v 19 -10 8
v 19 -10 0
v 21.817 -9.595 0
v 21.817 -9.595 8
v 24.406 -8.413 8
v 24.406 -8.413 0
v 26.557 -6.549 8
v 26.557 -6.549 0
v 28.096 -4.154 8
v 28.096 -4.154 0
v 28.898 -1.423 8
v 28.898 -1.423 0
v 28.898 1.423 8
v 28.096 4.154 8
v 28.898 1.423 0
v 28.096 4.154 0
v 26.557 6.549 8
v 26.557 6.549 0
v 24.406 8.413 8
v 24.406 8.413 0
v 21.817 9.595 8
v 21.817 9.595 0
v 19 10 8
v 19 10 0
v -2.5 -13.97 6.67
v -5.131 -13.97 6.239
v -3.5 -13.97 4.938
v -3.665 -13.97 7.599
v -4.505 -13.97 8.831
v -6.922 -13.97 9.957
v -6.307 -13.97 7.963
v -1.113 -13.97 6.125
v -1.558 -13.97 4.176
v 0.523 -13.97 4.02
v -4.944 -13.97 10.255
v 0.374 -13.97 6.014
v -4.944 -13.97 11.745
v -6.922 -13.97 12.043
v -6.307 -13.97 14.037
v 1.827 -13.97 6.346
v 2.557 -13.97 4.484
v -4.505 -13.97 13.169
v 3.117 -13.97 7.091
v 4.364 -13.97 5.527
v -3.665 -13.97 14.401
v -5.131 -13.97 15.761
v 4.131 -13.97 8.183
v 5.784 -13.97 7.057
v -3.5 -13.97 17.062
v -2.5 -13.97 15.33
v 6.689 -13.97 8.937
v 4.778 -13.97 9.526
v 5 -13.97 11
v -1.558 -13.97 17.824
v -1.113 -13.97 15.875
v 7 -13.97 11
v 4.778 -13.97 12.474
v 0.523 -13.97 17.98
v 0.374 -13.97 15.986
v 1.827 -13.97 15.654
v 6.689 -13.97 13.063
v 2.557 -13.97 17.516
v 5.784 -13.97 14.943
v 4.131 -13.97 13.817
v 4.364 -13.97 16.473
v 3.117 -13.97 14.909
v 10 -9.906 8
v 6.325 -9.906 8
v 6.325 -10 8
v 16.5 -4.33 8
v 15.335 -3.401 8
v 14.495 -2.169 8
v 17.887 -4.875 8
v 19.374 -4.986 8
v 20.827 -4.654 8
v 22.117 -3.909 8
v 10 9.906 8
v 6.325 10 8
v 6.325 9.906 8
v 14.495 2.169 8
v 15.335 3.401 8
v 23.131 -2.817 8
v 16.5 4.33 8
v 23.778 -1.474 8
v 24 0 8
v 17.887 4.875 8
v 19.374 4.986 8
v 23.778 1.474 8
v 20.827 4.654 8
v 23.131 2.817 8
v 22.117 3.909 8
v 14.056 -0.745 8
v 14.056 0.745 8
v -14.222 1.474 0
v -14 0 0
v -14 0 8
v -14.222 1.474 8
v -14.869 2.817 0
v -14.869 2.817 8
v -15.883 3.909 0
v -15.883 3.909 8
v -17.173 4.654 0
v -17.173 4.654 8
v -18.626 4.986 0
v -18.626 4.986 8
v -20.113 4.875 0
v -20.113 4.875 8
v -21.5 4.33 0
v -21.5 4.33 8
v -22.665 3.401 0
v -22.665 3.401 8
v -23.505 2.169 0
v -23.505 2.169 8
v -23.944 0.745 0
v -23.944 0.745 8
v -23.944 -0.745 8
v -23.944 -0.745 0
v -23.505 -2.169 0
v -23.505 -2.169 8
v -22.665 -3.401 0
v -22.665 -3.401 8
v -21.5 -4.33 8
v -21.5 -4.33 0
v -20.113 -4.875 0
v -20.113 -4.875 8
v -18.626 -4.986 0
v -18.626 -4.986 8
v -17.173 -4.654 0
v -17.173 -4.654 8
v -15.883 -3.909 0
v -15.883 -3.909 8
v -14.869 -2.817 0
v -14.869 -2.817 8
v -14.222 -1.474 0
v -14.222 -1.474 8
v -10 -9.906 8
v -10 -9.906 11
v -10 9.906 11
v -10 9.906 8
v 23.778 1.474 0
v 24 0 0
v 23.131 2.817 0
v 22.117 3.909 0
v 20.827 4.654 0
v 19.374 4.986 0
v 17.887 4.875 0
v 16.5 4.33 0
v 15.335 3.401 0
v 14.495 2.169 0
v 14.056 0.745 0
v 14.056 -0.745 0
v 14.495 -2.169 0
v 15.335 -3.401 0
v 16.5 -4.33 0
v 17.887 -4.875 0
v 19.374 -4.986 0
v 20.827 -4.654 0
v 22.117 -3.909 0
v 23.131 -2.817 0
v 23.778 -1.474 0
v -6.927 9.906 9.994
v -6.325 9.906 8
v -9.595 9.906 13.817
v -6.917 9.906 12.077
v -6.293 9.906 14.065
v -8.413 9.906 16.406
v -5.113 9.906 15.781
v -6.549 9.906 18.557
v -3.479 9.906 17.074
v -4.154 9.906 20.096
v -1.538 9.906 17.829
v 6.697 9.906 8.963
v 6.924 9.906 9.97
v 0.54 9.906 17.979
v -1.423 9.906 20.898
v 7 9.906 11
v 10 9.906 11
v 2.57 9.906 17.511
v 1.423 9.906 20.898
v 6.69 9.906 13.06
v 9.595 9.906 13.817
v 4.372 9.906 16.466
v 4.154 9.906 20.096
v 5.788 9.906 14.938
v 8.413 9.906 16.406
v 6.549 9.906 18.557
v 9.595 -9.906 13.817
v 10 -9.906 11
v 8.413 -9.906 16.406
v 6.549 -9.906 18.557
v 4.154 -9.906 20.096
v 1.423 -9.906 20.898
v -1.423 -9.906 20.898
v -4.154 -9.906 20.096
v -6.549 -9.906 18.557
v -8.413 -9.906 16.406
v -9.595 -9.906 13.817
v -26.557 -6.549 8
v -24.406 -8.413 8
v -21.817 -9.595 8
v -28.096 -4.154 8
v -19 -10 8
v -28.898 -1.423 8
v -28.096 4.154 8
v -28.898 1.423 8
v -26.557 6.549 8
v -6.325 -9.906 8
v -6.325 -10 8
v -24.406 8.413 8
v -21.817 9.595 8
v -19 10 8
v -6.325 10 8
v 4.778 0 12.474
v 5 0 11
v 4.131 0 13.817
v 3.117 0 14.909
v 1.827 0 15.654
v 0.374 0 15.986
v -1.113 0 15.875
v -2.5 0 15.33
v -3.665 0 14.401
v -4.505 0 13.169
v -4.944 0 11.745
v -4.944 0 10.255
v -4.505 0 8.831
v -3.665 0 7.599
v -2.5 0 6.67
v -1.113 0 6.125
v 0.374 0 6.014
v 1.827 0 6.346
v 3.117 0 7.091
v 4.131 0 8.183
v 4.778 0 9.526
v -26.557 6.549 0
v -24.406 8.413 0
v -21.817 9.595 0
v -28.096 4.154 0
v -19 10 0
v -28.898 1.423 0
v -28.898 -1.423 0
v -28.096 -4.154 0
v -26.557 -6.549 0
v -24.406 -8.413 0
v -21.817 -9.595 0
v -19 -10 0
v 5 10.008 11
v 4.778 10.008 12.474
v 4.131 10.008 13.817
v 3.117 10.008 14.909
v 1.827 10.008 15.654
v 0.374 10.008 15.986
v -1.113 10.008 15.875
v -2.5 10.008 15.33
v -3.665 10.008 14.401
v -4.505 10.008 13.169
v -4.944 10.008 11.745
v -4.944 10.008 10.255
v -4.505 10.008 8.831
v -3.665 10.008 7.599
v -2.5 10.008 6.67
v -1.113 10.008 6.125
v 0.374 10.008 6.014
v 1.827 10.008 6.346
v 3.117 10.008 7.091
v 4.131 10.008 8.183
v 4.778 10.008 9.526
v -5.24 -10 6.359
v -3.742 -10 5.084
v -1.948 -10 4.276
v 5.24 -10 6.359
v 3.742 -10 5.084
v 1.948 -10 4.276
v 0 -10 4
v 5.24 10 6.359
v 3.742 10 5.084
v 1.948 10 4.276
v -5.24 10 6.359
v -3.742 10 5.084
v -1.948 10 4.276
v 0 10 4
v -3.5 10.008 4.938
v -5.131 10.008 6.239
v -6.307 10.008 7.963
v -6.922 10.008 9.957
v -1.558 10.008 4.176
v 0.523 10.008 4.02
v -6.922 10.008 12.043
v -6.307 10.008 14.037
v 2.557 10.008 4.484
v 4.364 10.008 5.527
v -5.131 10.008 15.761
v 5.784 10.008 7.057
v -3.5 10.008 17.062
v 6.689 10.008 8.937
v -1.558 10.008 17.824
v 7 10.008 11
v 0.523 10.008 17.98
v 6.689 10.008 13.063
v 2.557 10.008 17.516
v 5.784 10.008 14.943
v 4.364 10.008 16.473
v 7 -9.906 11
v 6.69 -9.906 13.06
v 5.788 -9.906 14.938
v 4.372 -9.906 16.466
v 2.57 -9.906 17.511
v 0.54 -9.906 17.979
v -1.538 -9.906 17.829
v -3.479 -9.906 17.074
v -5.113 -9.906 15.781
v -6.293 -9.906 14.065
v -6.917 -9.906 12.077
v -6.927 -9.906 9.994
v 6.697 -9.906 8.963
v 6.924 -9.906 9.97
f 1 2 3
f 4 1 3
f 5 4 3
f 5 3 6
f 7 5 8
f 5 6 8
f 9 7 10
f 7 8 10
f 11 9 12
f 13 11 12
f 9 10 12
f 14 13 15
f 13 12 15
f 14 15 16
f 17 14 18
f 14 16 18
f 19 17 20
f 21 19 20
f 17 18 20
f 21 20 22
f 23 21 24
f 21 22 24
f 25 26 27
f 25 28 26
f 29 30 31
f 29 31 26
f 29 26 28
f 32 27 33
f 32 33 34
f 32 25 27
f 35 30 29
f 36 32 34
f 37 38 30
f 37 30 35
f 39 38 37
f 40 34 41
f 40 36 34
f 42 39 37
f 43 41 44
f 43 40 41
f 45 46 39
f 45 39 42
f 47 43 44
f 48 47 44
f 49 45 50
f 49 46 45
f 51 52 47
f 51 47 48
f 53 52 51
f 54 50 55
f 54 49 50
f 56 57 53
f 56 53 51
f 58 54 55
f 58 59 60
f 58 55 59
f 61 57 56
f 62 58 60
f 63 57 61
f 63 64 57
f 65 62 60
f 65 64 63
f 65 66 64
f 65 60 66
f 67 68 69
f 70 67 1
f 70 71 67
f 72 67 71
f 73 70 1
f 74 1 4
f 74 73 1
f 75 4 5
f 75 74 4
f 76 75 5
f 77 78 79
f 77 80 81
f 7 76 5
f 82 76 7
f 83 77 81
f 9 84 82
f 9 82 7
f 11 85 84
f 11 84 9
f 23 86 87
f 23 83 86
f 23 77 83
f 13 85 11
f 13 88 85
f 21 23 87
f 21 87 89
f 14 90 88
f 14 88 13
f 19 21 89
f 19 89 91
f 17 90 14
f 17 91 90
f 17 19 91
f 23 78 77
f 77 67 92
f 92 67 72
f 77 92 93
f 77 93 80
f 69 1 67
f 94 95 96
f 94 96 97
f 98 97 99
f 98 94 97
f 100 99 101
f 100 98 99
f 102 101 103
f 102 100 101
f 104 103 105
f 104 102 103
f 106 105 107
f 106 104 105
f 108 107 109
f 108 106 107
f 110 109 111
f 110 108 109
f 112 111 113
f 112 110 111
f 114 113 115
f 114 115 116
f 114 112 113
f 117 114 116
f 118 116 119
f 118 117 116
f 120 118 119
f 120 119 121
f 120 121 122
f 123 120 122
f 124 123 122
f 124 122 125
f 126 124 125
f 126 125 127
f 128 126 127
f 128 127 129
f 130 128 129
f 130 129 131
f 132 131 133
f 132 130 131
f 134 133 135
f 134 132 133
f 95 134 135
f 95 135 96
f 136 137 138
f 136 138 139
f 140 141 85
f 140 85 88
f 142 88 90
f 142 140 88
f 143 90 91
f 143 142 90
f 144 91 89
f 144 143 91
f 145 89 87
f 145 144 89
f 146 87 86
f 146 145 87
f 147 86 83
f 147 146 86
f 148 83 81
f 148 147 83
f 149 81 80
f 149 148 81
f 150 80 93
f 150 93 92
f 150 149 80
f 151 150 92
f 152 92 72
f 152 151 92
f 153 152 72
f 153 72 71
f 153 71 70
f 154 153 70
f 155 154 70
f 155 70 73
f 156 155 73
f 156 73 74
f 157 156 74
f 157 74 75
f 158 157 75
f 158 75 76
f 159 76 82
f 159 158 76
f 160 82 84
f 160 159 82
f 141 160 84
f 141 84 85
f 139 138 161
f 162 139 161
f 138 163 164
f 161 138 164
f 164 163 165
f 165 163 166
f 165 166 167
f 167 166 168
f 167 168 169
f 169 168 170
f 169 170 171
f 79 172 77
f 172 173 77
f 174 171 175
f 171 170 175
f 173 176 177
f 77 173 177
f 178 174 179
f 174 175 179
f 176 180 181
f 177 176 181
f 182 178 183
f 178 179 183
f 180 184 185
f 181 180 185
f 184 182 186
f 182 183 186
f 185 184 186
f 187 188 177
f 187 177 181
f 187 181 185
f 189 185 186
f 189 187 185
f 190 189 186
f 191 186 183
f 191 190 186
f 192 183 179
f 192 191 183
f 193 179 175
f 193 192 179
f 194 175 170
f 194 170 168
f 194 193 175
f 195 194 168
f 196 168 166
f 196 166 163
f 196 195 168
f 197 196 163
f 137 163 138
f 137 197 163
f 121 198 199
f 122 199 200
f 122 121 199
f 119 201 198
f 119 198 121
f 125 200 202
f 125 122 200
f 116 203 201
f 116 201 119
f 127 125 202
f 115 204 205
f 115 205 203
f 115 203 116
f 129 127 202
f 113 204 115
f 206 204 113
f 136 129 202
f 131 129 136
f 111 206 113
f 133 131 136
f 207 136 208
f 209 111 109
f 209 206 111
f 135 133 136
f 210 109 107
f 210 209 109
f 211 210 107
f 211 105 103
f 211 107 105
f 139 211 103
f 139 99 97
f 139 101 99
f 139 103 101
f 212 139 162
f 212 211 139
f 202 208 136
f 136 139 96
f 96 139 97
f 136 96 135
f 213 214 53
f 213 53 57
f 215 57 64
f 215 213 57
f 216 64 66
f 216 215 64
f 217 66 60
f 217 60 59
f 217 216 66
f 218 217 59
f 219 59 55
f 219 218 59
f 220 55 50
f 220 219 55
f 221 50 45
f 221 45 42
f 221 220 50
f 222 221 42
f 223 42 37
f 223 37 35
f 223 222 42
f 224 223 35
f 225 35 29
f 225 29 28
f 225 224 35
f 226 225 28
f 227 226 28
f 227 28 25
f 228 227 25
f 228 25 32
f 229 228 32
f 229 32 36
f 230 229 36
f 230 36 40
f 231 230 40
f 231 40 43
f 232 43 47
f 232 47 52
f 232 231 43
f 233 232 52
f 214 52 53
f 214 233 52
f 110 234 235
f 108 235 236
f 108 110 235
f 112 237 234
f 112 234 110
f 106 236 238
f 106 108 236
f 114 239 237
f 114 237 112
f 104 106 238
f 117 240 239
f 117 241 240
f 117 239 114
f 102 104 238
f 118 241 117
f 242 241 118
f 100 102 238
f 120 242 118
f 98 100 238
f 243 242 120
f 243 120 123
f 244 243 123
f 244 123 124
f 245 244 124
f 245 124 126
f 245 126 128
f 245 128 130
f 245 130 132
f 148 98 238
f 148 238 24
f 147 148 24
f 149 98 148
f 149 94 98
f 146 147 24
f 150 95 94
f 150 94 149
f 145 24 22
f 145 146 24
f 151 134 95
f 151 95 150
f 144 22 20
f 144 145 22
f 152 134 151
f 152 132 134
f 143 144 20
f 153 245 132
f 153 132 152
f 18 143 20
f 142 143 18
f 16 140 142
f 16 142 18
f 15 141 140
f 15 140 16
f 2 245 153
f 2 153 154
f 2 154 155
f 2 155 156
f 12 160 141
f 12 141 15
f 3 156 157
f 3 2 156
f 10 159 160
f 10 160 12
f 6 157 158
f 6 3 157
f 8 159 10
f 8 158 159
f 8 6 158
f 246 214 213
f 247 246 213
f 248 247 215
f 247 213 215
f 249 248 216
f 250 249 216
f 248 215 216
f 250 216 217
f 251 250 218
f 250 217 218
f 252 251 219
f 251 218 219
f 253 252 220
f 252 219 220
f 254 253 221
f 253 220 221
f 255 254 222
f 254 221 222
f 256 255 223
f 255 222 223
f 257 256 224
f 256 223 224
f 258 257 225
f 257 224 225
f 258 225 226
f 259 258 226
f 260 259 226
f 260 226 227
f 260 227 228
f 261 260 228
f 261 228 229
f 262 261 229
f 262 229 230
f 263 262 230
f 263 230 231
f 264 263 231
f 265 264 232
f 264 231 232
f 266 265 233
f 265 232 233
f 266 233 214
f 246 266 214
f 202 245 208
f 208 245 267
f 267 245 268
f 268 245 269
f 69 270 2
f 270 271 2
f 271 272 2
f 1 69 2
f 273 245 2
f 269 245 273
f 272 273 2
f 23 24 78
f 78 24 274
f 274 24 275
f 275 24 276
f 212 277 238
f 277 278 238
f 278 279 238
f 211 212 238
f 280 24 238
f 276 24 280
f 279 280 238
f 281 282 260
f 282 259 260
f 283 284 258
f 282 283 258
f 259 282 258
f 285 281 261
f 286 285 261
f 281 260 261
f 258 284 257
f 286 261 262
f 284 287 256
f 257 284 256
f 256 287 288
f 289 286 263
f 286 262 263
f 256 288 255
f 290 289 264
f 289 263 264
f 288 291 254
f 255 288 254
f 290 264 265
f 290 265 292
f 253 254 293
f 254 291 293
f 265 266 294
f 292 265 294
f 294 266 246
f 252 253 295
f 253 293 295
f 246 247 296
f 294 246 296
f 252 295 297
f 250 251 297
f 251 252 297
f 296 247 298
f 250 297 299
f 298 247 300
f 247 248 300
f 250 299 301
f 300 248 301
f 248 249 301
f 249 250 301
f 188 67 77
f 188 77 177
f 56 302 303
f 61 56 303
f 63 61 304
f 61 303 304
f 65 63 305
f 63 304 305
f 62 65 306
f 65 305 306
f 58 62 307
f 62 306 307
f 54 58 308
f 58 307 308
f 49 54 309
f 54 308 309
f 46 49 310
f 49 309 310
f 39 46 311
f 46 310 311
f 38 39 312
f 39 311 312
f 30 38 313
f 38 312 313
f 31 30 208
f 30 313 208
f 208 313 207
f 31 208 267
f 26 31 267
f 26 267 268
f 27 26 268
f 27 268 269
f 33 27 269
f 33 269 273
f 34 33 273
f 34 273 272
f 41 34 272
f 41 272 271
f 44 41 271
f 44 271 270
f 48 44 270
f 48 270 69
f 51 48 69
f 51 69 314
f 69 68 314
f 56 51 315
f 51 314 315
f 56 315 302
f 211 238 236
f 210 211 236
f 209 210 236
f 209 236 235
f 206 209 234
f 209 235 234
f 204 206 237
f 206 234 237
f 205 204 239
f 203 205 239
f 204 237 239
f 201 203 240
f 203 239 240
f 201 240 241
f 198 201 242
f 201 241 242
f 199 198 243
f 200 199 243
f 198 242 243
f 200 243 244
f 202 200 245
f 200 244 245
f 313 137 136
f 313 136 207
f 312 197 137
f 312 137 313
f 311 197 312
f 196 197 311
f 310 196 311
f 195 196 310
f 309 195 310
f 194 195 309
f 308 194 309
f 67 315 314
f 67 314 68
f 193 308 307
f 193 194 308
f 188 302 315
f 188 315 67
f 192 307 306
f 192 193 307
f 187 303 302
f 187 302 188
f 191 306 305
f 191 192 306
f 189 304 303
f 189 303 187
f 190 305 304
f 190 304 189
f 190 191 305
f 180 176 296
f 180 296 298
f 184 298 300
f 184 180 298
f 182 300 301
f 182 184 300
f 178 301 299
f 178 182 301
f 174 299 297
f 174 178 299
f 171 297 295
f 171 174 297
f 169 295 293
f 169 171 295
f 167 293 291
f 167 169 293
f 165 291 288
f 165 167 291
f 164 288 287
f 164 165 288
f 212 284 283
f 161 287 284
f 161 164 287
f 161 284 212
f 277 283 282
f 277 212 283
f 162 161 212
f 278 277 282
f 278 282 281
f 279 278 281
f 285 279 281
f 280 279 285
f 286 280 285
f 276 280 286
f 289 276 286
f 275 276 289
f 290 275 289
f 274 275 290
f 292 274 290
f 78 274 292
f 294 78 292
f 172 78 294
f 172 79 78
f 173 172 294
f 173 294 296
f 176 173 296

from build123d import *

# Parameters (mm, degrees)
F0_R          = 5
F1_DEPTH      = 8
F3_DEPTH      = 9.906
F4_R          = 7
F5_DEPTH      = 10.001
F5_DEPTH_BACK = 10.001
F6_R          = 7
F6_R_2        = 5
F7_DEPTH      = 13.97
F7_DEPTH_BACK = 10.0076


with BuildPart() as f1:
    # F0 (on Top) → F1 (new body)
    with BuildSketch(Plane.XY):
        with BuildLine():
            Line((-19, -10), (19, -10))
            ThreePointArc((19, -10), (29, 0), (19, 10))
            Line((19, 10), (-19, 10))
            ThreePointArc((-19, 10), (-29, 0), (-19, -10))
        make_face()
        with Locations((-19, 0)):
            Circle(F0_R, mode=Mode.SUBTRACT)
        with Locations((19, 0)):
            Circle(F0_R, mode=Mode.SUBTRACT)
    extrude(amount=F1_DEPTH)

    # F2 (on Front) → F3 (join, symmetric)
    with BuildSketch(Plane.XZ):
        with BuildLine():
            Line((10, 0), (10, 11))
            ThreePointArc((10, 11), (0, 21), (-10, 11))
            Line((-10, 11), (-10, 0))
            Line((-10, 0), (10, 0))
        make_face()
    extrude(amount=F3_DEPTH, both=True)

    # F4 (on Front) → F5 (cut, two sides)
    with BuildSketch(Plane.XZ) as f5_sk:
        with Locations((0, 11)):
            Circle(F4_R)
    extrude(amount=F5_DEPTH, mode=Mode.SUBTRACT)
    extrude(f5_sk.sketch, amount=-F5_DEPTH_BACK, mode=Mode.SUBTRACT)

    # F6 (on Front) → F7 (join, two sides)
    with BuildSketch(Plane.XZ) as f7_sk:
        with Locations((0, 11)):
            Circle(F6_R)
        with Locations((0, 11)):
            Circle(F6_R_2, mode=Mode.SUBTRACT)
    extrude(amount=F7_DEPTH)
    extrude(f7_sk.sketch, amount=-F7_DEPTH_BACK)


solid = f1.part
